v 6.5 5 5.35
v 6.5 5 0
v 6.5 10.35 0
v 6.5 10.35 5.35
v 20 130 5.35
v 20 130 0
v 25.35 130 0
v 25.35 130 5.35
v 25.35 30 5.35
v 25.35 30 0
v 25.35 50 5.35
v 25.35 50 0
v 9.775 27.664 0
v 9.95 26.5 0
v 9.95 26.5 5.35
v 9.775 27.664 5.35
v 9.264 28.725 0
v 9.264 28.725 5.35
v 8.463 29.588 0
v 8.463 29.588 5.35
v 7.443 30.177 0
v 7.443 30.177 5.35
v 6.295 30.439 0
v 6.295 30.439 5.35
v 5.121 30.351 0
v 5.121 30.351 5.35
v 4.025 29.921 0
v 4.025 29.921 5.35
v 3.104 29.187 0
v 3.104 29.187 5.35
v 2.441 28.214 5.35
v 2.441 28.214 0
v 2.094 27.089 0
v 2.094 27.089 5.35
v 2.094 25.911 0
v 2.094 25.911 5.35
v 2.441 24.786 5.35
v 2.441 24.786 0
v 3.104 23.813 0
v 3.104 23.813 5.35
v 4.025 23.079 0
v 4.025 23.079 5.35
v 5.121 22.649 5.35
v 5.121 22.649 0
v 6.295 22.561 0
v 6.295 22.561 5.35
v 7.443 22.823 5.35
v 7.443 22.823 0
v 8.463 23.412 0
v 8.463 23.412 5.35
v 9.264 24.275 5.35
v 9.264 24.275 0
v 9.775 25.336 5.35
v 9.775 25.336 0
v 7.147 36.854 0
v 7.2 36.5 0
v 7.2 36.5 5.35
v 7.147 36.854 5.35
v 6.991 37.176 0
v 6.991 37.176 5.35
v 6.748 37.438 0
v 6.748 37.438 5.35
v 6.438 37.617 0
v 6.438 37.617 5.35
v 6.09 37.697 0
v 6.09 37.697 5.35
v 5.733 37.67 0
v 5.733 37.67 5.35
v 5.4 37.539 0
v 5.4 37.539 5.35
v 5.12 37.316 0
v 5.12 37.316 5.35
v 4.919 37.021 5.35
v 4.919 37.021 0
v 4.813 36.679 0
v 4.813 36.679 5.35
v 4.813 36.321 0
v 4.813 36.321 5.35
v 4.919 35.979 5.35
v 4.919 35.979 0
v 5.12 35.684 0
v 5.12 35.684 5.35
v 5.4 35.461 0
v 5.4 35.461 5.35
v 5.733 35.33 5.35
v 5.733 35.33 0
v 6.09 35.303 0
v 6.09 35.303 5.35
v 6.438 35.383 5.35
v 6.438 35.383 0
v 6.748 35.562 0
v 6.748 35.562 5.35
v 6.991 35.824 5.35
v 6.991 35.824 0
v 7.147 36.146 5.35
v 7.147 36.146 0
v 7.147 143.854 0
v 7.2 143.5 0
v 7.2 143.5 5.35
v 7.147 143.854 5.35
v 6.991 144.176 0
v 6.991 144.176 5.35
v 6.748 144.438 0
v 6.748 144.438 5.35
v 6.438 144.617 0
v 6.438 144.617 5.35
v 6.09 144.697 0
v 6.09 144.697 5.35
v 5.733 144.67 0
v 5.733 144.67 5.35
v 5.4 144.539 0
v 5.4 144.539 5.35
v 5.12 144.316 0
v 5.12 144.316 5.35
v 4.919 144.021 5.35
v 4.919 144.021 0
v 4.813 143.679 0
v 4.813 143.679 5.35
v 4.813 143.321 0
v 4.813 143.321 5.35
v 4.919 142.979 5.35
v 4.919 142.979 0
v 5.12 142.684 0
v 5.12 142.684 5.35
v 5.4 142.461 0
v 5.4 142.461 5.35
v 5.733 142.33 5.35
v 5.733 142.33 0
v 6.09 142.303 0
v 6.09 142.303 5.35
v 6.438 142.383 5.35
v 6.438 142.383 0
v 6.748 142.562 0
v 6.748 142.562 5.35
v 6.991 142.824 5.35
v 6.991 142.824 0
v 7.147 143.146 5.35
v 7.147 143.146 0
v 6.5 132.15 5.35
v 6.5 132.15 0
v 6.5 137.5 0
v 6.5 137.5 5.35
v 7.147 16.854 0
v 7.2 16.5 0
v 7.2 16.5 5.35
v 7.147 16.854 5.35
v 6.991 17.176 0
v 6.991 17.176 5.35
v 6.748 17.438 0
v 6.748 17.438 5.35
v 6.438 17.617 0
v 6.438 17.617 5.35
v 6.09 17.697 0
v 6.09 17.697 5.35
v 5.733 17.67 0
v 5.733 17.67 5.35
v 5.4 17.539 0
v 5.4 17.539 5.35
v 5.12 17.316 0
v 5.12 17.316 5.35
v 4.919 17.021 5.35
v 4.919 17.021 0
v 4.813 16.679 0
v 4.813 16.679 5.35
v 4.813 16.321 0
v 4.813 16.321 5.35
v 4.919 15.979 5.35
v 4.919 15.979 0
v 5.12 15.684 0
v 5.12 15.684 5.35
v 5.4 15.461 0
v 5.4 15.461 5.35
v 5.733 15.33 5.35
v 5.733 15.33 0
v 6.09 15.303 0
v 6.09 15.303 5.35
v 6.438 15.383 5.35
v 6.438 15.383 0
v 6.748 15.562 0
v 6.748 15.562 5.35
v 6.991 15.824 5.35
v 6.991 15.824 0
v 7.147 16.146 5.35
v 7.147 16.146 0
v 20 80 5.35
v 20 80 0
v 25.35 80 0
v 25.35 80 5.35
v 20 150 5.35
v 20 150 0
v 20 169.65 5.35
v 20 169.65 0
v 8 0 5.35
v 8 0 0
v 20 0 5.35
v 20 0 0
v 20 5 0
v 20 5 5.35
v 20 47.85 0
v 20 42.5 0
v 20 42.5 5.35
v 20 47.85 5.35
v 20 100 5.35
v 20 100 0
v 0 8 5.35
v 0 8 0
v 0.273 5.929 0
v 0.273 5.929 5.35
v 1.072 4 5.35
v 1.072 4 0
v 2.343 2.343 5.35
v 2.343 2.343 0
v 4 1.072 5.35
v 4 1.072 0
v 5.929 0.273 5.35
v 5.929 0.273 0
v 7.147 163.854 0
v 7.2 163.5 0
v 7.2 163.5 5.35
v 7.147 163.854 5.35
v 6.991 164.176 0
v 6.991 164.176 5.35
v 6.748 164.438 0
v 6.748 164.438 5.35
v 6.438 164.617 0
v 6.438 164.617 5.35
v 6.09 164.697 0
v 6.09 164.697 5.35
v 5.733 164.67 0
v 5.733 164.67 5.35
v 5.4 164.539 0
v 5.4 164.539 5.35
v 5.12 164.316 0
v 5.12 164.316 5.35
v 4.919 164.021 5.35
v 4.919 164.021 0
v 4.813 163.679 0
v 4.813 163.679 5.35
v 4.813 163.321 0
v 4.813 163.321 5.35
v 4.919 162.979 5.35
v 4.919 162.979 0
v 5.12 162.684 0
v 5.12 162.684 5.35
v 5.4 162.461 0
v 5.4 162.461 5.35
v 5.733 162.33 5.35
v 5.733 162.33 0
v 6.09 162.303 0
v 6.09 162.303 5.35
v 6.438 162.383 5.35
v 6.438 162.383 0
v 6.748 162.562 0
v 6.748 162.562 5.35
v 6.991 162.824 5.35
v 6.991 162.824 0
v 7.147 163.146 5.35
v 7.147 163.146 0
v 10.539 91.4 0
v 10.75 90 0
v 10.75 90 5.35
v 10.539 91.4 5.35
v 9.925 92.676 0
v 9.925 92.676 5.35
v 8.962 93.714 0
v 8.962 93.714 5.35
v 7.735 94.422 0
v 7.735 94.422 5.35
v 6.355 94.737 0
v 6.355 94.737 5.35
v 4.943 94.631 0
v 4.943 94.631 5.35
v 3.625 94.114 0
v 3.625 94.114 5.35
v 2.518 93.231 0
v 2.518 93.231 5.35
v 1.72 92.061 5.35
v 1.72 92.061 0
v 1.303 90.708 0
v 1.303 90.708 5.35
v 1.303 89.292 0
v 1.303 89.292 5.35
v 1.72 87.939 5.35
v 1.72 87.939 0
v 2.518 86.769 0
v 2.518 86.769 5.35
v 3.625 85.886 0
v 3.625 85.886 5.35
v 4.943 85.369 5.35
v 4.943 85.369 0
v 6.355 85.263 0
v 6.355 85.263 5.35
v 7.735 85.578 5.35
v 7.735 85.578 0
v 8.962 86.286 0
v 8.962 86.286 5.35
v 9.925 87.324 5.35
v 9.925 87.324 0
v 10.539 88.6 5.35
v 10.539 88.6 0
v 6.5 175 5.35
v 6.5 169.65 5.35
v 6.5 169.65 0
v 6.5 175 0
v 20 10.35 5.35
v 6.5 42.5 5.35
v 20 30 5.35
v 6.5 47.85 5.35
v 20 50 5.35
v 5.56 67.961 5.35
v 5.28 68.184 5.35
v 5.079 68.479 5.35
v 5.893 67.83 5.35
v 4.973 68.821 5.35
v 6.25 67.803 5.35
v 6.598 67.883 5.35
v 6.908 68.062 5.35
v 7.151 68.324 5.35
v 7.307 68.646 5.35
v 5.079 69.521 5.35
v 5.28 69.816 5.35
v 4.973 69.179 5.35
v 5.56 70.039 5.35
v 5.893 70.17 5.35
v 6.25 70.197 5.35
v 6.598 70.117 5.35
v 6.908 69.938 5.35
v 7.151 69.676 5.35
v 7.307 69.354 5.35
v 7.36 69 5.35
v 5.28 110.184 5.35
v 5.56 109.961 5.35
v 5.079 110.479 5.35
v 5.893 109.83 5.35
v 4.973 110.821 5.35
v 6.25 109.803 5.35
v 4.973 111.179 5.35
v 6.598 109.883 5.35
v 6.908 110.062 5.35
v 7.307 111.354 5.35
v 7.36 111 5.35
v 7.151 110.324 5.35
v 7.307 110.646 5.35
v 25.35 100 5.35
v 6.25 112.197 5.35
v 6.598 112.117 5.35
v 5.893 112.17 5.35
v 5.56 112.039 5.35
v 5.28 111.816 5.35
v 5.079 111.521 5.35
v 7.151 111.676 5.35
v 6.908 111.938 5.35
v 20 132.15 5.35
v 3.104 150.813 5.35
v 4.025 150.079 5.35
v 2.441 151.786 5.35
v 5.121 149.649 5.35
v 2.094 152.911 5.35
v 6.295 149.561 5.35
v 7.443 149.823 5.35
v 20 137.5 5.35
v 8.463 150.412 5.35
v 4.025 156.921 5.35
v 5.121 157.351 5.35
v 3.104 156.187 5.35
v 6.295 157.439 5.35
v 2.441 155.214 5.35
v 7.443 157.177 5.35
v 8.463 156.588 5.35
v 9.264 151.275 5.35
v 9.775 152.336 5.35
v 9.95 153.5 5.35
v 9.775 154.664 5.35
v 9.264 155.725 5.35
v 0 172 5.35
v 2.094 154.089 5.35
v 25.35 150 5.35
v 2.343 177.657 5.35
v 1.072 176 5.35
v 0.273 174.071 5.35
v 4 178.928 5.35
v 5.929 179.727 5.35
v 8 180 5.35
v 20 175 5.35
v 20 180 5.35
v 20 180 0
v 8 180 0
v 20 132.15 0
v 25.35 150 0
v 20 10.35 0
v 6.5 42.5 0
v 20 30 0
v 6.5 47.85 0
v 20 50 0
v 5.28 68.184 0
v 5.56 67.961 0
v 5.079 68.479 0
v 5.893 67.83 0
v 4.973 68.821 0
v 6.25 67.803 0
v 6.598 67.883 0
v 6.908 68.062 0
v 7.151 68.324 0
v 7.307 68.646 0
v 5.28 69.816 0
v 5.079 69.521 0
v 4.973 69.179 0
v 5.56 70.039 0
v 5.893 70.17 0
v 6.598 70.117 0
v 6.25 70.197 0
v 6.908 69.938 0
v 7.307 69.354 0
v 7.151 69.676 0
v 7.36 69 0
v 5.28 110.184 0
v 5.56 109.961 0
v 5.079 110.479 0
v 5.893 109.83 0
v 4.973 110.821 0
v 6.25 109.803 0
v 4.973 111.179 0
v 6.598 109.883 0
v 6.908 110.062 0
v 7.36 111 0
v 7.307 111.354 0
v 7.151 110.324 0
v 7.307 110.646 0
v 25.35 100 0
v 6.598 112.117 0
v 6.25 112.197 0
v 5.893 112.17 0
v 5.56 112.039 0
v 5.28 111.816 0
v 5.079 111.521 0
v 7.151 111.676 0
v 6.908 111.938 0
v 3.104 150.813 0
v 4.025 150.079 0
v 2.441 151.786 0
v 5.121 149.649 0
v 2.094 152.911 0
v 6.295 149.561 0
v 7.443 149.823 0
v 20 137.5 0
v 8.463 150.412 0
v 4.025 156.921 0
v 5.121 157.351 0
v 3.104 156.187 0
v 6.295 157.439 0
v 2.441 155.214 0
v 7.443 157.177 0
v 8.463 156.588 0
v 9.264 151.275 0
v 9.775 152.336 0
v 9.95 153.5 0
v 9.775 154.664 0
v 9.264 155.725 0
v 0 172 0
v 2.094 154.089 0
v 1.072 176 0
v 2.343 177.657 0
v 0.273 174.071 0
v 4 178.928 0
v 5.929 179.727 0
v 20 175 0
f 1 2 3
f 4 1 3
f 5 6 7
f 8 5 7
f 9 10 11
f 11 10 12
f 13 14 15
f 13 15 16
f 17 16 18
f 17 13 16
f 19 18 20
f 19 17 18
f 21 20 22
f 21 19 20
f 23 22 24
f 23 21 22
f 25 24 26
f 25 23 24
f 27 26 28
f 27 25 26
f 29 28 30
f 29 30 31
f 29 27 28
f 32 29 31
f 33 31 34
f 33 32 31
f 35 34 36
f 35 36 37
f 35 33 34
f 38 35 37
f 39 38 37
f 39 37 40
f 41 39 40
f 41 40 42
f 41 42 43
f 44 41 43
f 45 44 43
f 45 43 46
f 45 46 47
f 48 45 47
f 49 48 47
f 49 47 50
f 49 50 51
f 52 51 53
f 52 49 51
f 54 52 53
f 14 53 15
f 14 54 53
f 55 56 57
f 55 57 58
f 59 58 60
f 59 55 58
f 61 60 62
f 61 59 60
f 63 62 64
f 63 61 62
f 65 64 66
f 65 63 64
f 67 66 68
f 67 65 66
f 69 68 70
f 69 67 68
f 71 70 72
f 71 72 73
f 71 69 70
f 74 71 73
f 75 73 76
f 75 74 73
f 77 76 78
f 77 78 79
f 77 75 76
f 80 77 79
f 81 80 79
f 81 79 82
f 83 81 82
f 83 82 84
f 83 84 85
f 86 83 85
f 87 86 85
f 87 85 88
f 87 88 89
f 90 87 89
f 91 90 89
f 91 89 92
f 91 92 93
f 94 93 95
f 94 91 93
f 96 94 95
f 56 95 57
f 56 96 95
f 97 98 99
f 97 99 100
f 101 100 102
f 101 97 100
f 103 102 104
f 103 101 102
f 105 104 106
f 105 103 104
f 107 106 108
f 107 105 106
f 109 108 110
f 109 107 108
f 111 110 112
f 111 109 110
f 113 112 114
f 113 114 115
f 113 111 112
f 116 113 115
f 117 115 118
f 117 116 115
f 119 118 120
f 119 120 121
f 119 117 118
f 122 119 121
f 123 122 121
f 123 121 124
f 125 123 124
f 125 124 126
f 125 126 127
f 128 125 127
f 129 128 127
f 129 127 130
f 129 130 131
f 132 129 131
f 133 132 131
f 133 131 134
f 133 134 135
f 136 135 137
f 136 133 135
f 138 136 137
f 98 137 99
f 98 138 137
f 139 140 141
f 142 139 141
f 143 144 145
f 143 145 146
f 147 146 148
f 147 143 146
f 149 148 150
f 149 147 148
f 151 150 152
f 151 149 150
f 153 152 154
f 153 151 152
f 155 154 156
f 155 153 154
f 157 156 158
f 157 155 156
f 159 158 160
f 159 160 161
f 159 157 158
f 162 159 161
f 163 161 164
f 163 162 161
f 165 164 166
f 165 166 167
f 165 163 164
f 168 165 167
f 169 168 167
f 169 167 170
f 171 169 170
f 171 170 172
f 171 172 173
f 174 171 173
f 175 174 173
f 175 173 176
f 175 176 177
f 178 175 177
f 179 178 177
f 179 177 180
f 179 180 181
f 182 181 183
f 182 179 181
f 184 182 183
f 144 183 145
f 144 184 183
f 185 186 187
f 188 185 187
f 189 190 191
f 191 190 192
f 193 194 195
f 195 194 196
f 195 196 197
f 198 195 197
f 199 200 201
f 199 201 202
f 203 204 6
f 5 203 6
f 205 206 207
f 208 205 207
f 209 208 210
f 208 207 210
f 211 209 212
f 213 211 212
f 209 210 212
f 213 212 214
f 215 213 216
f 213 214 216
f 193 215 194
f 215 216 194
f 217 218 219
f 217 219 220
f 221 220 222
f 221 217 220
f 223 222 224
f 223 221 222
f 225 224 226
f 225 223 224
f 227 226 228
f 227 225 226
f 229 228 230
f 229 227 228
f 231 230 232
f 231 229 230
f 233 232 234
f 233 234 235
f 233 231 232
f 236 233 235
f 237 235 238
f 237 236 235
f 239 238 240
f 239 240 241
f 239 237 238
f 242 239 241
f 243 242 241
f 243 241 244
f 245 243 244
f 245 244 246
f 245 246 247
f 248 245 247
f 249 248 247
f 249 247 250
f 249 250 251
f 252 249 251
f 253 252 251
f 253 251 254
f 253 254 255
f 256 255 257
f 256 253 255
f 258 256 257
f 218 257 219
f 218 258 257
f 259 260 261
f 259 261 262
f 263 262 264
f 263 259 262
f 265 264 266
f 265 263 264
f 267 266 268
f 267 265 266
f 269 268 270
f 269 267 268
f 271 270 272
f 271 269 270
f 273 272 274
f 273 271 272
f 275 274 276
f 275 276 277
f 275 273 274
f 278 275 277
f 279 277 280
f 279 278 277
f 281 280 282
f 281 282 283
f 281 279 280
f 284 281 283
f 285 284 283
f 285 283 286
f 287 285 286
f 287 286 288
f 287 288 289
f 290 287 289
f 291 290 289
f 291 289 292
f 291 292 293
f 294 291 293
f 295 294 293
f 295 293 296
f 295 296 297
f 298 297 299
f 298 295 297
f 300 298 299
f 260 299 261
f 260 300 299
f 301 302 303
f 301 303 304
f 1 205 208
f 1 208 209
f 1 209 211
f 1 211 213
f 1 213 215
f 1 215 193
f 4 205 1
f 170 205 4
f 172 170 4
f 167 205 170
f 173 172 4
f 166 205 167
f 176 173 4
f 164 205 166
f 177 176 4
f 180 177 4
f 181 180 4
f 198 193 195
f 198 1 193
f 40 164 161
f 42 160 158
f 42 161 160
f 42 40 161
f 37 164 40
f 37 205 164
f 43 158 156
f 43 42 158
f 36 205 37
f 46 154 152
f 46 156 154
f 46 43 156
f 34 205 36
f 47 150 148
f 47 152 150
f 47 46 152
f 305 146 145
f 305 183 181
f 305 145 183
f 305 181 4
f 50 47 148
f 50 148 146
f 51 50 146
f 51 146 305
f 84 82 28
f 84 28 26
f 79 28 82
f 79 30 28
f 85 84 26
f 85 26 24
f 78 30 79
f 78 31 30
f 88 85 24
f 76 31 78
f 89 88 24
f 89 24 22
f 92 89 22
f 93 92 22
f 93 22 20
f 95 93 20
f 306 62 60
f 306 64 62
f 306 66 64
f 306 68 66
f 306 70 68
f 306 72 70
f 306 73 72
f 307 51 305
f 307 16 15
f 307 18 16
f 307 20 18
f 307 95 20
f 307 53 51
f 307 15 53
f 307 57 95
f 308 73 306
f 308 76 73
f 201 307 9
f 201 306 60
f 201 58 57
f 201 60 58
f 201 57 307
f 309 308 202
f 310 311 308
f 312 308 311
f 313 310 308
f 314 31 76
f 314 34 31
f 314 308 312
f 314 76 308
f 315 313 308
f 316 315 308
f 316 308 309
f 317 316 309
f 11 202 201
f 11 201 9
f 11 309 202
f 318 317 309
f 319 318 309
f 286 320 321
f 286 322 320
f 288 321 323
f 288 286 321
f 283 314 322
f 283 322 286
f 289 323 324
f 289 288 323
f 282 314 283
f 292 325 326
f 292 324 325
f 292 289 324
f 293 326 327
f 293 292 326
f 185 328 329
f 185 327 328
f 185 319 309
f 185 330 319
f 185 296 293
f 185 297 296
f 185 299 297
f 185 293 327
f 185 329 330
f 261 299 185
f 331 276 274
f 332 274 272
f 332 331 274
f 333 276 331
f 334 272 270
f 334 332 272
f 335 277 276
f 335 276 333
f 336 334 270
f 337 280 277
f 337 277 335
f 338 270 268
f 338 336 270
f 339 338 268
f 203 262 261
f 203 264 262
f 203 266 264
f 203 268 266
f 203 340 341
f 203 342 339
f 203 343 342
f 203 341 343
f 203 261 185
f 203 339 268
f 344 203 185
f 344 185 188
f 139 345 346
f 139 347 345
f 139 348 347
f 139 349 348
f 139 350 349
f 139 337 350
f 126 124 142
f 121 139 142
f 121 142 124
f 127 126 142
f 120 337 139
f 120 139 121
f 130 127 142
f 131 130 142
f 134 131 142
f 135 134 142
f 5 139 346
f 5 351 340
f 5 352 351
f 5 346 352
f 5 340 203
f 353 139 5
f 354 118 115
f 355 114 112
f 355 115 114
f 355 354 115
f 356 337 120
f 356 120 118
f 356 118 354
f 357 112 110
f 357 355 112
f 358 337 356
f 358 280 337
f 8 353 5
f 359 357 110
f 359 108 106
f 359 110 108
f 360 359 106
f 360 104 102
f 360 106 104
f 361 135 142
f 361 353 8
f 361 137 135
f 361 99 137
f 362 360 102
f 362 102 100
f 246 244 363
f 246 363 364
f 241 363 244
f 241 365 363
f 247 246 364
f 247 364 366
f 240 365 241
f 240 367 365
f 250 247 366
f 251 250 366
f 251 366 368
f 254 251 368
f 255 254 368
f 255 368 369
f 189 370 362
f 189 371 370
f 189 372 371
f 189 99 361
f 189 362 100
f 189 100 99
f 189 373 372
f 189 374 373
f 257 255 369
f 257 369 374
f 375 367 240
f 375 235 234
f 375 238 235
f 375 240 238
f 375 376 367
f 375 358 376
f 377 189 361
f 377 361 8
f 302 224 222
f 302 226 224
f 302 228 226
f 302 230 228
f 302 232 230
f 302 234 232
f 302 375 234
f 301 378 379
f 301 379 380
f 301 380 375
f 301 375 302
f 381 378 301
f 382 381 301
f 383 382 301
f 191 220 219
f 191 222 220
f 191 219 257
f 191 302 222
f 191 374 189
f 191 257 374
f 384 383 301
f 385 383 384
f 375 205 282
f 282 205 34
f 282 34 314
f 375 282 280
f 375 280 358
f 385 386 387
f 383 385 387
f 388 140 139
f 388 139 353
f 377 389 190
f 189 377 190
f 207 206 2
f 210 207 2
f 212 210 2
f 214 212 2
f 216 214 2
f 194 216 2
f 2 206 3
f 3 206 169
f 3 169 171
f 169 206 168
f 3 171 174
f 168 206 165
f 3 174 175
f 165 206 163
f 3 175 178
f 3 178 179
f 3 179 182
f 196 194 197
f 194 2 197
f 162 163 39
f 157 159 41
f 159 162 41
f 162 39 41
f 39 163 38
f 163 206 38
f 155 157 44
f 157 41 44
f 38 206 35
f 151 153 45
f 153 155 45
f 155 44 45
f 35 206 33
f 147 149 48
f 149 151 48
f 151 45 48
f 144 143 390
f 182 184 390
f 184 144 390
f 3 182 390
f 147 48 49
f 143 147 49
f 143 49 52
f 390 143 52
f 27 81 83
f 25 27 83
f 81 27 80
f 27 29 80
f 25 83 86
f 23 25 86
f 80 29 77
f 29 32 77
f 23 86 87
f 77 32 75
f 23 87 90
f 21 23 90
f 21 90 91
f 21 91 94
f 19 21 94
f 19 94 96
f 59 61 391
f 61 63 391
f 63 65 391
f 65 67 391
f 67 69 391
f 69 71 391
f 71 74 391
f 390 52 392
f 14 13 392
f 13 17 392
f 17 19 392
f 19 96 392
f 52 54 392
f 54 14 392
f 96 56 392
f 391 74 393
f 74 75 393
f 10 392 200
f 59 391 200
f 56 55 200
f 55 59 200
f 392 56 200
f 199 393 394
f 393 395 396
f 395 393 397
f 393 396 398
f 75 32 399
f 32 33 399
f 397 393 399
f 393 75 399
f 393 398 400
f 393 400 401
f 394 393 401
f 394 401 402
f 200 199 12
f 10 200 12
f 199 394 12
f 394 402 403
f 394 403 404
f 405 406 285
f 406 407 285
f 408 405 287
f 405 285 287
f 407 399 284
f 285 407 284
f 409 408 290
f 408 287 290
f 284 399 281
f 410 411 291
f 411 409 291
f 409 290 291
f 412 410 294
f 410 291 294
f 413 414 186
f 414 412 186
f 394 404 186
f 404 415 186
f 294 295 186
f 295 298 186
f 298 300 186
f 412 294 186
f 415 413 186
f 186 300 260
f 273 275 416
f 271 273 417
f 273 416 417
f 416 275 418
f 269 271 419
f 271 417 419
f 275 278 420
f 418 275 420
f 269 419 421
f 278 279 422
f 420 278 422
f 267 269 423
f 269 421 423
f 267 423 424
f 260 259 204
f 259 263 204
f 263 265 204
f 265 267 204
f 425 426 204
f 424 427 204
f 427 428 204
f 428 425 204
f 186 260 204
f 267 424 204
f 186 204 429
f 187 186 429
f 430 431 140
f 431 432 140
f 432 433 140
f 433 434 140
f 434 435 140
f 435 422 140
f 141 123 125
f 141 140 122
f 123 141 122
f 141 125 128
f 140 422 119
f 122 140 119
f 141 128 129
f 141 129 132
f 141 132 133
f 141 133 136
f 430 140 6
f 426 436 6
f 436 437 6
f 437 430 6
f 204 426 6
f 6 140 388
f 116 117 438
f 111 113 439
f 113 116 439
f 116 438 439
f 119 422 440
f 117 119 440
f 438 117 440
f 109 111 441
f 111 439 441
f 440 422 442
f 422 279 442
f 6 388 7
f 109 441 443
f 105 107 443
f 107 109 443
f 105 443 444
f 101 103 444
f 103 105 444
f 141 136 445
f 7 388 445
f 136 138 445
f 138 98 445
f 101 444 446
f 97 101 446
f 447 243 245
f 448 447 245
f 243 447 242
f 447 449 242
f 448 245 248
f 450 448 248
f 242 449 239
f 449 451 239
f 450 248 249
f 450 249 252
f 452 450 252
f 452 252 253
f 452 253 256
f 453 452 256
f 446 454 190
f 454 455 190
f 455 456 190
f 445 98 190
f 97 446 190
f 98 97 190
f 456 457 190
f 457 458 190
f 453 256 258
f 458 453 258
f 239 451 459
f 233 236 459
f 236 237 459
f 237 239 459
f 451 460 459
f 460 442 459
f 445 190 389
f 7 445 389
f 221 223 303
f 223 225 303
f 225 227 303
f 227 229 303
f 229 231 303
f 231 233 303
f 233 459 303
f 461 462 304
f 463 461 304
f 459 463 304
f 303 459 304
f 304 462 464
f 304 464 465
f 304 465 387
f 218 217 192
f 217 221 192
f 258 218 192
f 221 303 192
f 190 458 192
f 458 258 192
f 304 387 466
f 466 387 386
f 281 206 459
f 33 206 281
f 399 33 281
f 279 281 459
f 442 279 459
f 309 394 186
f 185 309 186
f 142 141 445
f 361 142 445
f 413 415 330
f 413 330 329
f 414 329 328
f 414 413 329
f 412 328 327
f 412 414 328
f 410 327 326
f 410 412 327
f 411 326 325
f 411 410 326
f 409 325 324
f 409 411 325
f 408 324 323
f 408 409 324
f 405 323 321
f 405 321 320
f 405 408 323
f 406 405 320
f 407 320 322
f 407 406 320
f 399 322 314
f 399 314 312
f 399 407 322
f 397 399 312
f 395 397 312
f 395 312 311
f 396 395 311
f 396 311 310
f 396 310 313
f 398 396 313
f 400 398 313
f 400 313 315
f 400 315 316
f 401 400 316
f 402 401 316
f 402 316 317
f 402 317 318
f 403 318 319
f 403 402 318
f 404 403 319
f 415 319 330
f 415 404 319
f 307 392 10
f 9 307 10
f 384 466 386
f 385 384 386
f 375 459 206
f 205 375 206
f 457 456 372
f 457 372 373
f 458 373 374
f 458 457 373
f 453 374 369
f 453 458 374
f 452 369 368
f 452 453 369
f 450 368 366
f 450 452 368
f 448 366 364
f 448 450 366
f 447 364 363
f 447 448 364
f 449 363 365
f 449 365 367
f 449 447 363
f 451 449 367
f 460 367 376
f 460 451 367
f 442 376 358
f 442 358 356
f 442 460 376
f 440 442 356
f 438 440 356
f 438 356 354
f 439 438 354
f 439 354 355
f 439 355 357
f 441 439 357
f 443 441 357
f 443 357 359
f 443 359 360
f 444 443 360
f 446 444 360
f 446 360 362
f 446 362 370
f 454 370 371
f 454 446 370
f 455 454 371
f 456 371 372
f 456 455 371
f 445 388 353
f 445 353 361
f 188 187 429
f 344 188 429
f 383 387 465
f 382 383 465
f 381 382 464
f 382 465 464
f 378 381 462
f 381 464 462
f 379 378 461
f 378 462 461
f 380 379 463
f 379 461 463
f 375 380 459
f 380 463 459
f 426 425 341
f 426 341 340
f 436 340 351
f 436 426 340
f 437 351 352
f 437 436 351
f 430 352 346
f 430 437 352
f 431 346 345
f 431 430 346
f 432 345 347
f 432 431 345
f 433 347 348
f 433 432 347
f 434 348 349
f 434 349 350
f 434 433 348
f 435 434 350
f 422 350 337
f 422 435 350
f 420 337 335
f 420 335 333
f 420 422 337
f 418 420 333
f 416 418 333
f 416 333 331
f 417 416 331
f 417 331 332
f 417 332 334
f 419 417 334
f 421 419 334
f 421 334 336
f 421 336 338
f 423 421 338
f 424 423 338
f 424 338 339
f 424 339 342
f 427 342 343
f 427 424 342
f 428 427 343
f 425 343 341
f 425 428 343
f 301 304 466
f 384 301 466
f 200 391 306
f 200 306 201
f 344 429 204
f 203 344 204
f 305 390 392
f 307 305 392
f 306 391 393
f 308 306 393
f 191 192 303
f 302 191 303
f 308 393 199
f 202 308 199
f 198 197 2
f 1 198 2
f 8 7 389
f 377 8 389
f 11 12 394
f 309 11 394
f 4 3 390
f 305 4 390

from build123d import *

# Parameters (mm, degrees)
MODEL_R             = 4.75
MODEL_R_2           = 3.95
MODEL_R_3           = 1.2
MODEL_W             = 13.50000035
MODEL_H             = 5.350001156
MODEL_H_2           = 5.350008607
BOSS_EXTRUDE1_DEPTH = 5.35


with BuildPart() as part:
    # Model → Boss-Extrude1 (new body)
    with BuildSketch(Plane.XY):
        with BuildLine():
            Line((19.999999553, 174.99999702), (19.999999553, 180.000007153))
            Line((19.999999553, 180.000007153), (7.999999449, 180.000007153))
            ThreePointArc((7.999999449, 180.000007153), (2.343145556, 177.656861207), (0, 172.000007153))
            Line((0, 172.000007153), (0, 8.00000038))
            ThreePointArc((0, 8.00000038), (2.343145616, 2.343145885), (8, 0))
            Line((8, 0), (19.999999553, 0))
            Line((19.999999553, 0), (19.999999553, 4.999999888))
            Line((19.999999553, 4.999999888), (6.499999203, 4.999999888))
            Line((6.499999203, 4.999999888), (6.499999203, 10.350000113))
            Line((6.499999203, 10.350000113), (19.999999553, 10.350000113))
            Line((19.999999553, 10.350000113), (19.999999553, 29.99999933))
            Line((19.999999553, 29.99999933), (25.349999778, 29.99999933))
            Line((25.349999778, 29.99999933), (25.349999778, 50.000000745))
            Line((25.349999778, 50.000000745), (19.999999553, 50.000000745))
            Line((19.999999553, 50.000000745), (19.999999553, 79.999998212))
            Line((19.999999553, 79.999998212), (25.349999778, 79.999998212))
            Line((25.349999778, 79.999998212), (25.349999778, 100.00000149))
            Line((25.349999778, 100.00000149), (19.999999553, 100.00000149))
            Line((19.999999553, 100.00000149), (19.999999553, 129.999995232))
            Line((19.999999553, 129.999995232), (25.349999778, 129.999995232))
            Line((25.349999778, 129.999995232), (25.349999778, 150.000005961))
            Line((25.349999778, 150.000005961), (19.999999553, 150.000005961))
            Line((19.999999553, 150.000005961), (19.999999553, 169.650003314))
            Line((19.999999553, 169.650003314), (6.499999203, 169.650003314))
            Line((6.499999203, 169.650003314), (6.499999203, 174.99999702))
            Line((6.499999203, 174.99999702), (19.999999553, 174.99999702))
        make_face()
        with Locations((5.999999553, 90)):
            Circle(MODEL_R, mode=Mode.SUBTRACT)
        with Locations((5.999999553, 26.5)):
            Circle(MODEL_R_2, mode=Mode.SUBTRACT)
        with Locations((5.999999553, 153.5)):
            Circle(MODEL_R_2, mode=Mode.SUBTRACT)
        with Locations((6.159999553, 111)):
            Circle(MODEL_R_3, mode=Mode.SUBTRACT)
        with Locations((6.159999553, 69)):
            Circle(MODEL_R_3, mode=Mode.SUBTRACT)
        with Locations((5.999999553, 36.5)):
            Circle(MODEL_R_3, mode=Mode.SUBTRACT)
        with Locations((5.999999553, 16.5)):
            Circle(MODEL_R_3, mode=Mode.SUBTRACT)
        with Locations((5.999999553, 143.5)):
            Circle(MODEL_R_3, mode=Mode.SUBTRACT)
        with Locations((5.999999553, 163.5)):
            Circle(MODEL_R_3, mode=Mode.SUBTRACT)
        with Locations((13.249999378, 45.175001025)):
            Rectangle(MODEL_W, MODEL_H, mode=Mode.SUBTRACT)
        with Locations((13.249999378, 134.824998677)):
            Rectangle(MODEL_W, MODEL_H_2, mode=Mode.SUBTRACT)
    extrude(amount=BOSS_EXTRUDE1_DEPTH)


solid = part.part
